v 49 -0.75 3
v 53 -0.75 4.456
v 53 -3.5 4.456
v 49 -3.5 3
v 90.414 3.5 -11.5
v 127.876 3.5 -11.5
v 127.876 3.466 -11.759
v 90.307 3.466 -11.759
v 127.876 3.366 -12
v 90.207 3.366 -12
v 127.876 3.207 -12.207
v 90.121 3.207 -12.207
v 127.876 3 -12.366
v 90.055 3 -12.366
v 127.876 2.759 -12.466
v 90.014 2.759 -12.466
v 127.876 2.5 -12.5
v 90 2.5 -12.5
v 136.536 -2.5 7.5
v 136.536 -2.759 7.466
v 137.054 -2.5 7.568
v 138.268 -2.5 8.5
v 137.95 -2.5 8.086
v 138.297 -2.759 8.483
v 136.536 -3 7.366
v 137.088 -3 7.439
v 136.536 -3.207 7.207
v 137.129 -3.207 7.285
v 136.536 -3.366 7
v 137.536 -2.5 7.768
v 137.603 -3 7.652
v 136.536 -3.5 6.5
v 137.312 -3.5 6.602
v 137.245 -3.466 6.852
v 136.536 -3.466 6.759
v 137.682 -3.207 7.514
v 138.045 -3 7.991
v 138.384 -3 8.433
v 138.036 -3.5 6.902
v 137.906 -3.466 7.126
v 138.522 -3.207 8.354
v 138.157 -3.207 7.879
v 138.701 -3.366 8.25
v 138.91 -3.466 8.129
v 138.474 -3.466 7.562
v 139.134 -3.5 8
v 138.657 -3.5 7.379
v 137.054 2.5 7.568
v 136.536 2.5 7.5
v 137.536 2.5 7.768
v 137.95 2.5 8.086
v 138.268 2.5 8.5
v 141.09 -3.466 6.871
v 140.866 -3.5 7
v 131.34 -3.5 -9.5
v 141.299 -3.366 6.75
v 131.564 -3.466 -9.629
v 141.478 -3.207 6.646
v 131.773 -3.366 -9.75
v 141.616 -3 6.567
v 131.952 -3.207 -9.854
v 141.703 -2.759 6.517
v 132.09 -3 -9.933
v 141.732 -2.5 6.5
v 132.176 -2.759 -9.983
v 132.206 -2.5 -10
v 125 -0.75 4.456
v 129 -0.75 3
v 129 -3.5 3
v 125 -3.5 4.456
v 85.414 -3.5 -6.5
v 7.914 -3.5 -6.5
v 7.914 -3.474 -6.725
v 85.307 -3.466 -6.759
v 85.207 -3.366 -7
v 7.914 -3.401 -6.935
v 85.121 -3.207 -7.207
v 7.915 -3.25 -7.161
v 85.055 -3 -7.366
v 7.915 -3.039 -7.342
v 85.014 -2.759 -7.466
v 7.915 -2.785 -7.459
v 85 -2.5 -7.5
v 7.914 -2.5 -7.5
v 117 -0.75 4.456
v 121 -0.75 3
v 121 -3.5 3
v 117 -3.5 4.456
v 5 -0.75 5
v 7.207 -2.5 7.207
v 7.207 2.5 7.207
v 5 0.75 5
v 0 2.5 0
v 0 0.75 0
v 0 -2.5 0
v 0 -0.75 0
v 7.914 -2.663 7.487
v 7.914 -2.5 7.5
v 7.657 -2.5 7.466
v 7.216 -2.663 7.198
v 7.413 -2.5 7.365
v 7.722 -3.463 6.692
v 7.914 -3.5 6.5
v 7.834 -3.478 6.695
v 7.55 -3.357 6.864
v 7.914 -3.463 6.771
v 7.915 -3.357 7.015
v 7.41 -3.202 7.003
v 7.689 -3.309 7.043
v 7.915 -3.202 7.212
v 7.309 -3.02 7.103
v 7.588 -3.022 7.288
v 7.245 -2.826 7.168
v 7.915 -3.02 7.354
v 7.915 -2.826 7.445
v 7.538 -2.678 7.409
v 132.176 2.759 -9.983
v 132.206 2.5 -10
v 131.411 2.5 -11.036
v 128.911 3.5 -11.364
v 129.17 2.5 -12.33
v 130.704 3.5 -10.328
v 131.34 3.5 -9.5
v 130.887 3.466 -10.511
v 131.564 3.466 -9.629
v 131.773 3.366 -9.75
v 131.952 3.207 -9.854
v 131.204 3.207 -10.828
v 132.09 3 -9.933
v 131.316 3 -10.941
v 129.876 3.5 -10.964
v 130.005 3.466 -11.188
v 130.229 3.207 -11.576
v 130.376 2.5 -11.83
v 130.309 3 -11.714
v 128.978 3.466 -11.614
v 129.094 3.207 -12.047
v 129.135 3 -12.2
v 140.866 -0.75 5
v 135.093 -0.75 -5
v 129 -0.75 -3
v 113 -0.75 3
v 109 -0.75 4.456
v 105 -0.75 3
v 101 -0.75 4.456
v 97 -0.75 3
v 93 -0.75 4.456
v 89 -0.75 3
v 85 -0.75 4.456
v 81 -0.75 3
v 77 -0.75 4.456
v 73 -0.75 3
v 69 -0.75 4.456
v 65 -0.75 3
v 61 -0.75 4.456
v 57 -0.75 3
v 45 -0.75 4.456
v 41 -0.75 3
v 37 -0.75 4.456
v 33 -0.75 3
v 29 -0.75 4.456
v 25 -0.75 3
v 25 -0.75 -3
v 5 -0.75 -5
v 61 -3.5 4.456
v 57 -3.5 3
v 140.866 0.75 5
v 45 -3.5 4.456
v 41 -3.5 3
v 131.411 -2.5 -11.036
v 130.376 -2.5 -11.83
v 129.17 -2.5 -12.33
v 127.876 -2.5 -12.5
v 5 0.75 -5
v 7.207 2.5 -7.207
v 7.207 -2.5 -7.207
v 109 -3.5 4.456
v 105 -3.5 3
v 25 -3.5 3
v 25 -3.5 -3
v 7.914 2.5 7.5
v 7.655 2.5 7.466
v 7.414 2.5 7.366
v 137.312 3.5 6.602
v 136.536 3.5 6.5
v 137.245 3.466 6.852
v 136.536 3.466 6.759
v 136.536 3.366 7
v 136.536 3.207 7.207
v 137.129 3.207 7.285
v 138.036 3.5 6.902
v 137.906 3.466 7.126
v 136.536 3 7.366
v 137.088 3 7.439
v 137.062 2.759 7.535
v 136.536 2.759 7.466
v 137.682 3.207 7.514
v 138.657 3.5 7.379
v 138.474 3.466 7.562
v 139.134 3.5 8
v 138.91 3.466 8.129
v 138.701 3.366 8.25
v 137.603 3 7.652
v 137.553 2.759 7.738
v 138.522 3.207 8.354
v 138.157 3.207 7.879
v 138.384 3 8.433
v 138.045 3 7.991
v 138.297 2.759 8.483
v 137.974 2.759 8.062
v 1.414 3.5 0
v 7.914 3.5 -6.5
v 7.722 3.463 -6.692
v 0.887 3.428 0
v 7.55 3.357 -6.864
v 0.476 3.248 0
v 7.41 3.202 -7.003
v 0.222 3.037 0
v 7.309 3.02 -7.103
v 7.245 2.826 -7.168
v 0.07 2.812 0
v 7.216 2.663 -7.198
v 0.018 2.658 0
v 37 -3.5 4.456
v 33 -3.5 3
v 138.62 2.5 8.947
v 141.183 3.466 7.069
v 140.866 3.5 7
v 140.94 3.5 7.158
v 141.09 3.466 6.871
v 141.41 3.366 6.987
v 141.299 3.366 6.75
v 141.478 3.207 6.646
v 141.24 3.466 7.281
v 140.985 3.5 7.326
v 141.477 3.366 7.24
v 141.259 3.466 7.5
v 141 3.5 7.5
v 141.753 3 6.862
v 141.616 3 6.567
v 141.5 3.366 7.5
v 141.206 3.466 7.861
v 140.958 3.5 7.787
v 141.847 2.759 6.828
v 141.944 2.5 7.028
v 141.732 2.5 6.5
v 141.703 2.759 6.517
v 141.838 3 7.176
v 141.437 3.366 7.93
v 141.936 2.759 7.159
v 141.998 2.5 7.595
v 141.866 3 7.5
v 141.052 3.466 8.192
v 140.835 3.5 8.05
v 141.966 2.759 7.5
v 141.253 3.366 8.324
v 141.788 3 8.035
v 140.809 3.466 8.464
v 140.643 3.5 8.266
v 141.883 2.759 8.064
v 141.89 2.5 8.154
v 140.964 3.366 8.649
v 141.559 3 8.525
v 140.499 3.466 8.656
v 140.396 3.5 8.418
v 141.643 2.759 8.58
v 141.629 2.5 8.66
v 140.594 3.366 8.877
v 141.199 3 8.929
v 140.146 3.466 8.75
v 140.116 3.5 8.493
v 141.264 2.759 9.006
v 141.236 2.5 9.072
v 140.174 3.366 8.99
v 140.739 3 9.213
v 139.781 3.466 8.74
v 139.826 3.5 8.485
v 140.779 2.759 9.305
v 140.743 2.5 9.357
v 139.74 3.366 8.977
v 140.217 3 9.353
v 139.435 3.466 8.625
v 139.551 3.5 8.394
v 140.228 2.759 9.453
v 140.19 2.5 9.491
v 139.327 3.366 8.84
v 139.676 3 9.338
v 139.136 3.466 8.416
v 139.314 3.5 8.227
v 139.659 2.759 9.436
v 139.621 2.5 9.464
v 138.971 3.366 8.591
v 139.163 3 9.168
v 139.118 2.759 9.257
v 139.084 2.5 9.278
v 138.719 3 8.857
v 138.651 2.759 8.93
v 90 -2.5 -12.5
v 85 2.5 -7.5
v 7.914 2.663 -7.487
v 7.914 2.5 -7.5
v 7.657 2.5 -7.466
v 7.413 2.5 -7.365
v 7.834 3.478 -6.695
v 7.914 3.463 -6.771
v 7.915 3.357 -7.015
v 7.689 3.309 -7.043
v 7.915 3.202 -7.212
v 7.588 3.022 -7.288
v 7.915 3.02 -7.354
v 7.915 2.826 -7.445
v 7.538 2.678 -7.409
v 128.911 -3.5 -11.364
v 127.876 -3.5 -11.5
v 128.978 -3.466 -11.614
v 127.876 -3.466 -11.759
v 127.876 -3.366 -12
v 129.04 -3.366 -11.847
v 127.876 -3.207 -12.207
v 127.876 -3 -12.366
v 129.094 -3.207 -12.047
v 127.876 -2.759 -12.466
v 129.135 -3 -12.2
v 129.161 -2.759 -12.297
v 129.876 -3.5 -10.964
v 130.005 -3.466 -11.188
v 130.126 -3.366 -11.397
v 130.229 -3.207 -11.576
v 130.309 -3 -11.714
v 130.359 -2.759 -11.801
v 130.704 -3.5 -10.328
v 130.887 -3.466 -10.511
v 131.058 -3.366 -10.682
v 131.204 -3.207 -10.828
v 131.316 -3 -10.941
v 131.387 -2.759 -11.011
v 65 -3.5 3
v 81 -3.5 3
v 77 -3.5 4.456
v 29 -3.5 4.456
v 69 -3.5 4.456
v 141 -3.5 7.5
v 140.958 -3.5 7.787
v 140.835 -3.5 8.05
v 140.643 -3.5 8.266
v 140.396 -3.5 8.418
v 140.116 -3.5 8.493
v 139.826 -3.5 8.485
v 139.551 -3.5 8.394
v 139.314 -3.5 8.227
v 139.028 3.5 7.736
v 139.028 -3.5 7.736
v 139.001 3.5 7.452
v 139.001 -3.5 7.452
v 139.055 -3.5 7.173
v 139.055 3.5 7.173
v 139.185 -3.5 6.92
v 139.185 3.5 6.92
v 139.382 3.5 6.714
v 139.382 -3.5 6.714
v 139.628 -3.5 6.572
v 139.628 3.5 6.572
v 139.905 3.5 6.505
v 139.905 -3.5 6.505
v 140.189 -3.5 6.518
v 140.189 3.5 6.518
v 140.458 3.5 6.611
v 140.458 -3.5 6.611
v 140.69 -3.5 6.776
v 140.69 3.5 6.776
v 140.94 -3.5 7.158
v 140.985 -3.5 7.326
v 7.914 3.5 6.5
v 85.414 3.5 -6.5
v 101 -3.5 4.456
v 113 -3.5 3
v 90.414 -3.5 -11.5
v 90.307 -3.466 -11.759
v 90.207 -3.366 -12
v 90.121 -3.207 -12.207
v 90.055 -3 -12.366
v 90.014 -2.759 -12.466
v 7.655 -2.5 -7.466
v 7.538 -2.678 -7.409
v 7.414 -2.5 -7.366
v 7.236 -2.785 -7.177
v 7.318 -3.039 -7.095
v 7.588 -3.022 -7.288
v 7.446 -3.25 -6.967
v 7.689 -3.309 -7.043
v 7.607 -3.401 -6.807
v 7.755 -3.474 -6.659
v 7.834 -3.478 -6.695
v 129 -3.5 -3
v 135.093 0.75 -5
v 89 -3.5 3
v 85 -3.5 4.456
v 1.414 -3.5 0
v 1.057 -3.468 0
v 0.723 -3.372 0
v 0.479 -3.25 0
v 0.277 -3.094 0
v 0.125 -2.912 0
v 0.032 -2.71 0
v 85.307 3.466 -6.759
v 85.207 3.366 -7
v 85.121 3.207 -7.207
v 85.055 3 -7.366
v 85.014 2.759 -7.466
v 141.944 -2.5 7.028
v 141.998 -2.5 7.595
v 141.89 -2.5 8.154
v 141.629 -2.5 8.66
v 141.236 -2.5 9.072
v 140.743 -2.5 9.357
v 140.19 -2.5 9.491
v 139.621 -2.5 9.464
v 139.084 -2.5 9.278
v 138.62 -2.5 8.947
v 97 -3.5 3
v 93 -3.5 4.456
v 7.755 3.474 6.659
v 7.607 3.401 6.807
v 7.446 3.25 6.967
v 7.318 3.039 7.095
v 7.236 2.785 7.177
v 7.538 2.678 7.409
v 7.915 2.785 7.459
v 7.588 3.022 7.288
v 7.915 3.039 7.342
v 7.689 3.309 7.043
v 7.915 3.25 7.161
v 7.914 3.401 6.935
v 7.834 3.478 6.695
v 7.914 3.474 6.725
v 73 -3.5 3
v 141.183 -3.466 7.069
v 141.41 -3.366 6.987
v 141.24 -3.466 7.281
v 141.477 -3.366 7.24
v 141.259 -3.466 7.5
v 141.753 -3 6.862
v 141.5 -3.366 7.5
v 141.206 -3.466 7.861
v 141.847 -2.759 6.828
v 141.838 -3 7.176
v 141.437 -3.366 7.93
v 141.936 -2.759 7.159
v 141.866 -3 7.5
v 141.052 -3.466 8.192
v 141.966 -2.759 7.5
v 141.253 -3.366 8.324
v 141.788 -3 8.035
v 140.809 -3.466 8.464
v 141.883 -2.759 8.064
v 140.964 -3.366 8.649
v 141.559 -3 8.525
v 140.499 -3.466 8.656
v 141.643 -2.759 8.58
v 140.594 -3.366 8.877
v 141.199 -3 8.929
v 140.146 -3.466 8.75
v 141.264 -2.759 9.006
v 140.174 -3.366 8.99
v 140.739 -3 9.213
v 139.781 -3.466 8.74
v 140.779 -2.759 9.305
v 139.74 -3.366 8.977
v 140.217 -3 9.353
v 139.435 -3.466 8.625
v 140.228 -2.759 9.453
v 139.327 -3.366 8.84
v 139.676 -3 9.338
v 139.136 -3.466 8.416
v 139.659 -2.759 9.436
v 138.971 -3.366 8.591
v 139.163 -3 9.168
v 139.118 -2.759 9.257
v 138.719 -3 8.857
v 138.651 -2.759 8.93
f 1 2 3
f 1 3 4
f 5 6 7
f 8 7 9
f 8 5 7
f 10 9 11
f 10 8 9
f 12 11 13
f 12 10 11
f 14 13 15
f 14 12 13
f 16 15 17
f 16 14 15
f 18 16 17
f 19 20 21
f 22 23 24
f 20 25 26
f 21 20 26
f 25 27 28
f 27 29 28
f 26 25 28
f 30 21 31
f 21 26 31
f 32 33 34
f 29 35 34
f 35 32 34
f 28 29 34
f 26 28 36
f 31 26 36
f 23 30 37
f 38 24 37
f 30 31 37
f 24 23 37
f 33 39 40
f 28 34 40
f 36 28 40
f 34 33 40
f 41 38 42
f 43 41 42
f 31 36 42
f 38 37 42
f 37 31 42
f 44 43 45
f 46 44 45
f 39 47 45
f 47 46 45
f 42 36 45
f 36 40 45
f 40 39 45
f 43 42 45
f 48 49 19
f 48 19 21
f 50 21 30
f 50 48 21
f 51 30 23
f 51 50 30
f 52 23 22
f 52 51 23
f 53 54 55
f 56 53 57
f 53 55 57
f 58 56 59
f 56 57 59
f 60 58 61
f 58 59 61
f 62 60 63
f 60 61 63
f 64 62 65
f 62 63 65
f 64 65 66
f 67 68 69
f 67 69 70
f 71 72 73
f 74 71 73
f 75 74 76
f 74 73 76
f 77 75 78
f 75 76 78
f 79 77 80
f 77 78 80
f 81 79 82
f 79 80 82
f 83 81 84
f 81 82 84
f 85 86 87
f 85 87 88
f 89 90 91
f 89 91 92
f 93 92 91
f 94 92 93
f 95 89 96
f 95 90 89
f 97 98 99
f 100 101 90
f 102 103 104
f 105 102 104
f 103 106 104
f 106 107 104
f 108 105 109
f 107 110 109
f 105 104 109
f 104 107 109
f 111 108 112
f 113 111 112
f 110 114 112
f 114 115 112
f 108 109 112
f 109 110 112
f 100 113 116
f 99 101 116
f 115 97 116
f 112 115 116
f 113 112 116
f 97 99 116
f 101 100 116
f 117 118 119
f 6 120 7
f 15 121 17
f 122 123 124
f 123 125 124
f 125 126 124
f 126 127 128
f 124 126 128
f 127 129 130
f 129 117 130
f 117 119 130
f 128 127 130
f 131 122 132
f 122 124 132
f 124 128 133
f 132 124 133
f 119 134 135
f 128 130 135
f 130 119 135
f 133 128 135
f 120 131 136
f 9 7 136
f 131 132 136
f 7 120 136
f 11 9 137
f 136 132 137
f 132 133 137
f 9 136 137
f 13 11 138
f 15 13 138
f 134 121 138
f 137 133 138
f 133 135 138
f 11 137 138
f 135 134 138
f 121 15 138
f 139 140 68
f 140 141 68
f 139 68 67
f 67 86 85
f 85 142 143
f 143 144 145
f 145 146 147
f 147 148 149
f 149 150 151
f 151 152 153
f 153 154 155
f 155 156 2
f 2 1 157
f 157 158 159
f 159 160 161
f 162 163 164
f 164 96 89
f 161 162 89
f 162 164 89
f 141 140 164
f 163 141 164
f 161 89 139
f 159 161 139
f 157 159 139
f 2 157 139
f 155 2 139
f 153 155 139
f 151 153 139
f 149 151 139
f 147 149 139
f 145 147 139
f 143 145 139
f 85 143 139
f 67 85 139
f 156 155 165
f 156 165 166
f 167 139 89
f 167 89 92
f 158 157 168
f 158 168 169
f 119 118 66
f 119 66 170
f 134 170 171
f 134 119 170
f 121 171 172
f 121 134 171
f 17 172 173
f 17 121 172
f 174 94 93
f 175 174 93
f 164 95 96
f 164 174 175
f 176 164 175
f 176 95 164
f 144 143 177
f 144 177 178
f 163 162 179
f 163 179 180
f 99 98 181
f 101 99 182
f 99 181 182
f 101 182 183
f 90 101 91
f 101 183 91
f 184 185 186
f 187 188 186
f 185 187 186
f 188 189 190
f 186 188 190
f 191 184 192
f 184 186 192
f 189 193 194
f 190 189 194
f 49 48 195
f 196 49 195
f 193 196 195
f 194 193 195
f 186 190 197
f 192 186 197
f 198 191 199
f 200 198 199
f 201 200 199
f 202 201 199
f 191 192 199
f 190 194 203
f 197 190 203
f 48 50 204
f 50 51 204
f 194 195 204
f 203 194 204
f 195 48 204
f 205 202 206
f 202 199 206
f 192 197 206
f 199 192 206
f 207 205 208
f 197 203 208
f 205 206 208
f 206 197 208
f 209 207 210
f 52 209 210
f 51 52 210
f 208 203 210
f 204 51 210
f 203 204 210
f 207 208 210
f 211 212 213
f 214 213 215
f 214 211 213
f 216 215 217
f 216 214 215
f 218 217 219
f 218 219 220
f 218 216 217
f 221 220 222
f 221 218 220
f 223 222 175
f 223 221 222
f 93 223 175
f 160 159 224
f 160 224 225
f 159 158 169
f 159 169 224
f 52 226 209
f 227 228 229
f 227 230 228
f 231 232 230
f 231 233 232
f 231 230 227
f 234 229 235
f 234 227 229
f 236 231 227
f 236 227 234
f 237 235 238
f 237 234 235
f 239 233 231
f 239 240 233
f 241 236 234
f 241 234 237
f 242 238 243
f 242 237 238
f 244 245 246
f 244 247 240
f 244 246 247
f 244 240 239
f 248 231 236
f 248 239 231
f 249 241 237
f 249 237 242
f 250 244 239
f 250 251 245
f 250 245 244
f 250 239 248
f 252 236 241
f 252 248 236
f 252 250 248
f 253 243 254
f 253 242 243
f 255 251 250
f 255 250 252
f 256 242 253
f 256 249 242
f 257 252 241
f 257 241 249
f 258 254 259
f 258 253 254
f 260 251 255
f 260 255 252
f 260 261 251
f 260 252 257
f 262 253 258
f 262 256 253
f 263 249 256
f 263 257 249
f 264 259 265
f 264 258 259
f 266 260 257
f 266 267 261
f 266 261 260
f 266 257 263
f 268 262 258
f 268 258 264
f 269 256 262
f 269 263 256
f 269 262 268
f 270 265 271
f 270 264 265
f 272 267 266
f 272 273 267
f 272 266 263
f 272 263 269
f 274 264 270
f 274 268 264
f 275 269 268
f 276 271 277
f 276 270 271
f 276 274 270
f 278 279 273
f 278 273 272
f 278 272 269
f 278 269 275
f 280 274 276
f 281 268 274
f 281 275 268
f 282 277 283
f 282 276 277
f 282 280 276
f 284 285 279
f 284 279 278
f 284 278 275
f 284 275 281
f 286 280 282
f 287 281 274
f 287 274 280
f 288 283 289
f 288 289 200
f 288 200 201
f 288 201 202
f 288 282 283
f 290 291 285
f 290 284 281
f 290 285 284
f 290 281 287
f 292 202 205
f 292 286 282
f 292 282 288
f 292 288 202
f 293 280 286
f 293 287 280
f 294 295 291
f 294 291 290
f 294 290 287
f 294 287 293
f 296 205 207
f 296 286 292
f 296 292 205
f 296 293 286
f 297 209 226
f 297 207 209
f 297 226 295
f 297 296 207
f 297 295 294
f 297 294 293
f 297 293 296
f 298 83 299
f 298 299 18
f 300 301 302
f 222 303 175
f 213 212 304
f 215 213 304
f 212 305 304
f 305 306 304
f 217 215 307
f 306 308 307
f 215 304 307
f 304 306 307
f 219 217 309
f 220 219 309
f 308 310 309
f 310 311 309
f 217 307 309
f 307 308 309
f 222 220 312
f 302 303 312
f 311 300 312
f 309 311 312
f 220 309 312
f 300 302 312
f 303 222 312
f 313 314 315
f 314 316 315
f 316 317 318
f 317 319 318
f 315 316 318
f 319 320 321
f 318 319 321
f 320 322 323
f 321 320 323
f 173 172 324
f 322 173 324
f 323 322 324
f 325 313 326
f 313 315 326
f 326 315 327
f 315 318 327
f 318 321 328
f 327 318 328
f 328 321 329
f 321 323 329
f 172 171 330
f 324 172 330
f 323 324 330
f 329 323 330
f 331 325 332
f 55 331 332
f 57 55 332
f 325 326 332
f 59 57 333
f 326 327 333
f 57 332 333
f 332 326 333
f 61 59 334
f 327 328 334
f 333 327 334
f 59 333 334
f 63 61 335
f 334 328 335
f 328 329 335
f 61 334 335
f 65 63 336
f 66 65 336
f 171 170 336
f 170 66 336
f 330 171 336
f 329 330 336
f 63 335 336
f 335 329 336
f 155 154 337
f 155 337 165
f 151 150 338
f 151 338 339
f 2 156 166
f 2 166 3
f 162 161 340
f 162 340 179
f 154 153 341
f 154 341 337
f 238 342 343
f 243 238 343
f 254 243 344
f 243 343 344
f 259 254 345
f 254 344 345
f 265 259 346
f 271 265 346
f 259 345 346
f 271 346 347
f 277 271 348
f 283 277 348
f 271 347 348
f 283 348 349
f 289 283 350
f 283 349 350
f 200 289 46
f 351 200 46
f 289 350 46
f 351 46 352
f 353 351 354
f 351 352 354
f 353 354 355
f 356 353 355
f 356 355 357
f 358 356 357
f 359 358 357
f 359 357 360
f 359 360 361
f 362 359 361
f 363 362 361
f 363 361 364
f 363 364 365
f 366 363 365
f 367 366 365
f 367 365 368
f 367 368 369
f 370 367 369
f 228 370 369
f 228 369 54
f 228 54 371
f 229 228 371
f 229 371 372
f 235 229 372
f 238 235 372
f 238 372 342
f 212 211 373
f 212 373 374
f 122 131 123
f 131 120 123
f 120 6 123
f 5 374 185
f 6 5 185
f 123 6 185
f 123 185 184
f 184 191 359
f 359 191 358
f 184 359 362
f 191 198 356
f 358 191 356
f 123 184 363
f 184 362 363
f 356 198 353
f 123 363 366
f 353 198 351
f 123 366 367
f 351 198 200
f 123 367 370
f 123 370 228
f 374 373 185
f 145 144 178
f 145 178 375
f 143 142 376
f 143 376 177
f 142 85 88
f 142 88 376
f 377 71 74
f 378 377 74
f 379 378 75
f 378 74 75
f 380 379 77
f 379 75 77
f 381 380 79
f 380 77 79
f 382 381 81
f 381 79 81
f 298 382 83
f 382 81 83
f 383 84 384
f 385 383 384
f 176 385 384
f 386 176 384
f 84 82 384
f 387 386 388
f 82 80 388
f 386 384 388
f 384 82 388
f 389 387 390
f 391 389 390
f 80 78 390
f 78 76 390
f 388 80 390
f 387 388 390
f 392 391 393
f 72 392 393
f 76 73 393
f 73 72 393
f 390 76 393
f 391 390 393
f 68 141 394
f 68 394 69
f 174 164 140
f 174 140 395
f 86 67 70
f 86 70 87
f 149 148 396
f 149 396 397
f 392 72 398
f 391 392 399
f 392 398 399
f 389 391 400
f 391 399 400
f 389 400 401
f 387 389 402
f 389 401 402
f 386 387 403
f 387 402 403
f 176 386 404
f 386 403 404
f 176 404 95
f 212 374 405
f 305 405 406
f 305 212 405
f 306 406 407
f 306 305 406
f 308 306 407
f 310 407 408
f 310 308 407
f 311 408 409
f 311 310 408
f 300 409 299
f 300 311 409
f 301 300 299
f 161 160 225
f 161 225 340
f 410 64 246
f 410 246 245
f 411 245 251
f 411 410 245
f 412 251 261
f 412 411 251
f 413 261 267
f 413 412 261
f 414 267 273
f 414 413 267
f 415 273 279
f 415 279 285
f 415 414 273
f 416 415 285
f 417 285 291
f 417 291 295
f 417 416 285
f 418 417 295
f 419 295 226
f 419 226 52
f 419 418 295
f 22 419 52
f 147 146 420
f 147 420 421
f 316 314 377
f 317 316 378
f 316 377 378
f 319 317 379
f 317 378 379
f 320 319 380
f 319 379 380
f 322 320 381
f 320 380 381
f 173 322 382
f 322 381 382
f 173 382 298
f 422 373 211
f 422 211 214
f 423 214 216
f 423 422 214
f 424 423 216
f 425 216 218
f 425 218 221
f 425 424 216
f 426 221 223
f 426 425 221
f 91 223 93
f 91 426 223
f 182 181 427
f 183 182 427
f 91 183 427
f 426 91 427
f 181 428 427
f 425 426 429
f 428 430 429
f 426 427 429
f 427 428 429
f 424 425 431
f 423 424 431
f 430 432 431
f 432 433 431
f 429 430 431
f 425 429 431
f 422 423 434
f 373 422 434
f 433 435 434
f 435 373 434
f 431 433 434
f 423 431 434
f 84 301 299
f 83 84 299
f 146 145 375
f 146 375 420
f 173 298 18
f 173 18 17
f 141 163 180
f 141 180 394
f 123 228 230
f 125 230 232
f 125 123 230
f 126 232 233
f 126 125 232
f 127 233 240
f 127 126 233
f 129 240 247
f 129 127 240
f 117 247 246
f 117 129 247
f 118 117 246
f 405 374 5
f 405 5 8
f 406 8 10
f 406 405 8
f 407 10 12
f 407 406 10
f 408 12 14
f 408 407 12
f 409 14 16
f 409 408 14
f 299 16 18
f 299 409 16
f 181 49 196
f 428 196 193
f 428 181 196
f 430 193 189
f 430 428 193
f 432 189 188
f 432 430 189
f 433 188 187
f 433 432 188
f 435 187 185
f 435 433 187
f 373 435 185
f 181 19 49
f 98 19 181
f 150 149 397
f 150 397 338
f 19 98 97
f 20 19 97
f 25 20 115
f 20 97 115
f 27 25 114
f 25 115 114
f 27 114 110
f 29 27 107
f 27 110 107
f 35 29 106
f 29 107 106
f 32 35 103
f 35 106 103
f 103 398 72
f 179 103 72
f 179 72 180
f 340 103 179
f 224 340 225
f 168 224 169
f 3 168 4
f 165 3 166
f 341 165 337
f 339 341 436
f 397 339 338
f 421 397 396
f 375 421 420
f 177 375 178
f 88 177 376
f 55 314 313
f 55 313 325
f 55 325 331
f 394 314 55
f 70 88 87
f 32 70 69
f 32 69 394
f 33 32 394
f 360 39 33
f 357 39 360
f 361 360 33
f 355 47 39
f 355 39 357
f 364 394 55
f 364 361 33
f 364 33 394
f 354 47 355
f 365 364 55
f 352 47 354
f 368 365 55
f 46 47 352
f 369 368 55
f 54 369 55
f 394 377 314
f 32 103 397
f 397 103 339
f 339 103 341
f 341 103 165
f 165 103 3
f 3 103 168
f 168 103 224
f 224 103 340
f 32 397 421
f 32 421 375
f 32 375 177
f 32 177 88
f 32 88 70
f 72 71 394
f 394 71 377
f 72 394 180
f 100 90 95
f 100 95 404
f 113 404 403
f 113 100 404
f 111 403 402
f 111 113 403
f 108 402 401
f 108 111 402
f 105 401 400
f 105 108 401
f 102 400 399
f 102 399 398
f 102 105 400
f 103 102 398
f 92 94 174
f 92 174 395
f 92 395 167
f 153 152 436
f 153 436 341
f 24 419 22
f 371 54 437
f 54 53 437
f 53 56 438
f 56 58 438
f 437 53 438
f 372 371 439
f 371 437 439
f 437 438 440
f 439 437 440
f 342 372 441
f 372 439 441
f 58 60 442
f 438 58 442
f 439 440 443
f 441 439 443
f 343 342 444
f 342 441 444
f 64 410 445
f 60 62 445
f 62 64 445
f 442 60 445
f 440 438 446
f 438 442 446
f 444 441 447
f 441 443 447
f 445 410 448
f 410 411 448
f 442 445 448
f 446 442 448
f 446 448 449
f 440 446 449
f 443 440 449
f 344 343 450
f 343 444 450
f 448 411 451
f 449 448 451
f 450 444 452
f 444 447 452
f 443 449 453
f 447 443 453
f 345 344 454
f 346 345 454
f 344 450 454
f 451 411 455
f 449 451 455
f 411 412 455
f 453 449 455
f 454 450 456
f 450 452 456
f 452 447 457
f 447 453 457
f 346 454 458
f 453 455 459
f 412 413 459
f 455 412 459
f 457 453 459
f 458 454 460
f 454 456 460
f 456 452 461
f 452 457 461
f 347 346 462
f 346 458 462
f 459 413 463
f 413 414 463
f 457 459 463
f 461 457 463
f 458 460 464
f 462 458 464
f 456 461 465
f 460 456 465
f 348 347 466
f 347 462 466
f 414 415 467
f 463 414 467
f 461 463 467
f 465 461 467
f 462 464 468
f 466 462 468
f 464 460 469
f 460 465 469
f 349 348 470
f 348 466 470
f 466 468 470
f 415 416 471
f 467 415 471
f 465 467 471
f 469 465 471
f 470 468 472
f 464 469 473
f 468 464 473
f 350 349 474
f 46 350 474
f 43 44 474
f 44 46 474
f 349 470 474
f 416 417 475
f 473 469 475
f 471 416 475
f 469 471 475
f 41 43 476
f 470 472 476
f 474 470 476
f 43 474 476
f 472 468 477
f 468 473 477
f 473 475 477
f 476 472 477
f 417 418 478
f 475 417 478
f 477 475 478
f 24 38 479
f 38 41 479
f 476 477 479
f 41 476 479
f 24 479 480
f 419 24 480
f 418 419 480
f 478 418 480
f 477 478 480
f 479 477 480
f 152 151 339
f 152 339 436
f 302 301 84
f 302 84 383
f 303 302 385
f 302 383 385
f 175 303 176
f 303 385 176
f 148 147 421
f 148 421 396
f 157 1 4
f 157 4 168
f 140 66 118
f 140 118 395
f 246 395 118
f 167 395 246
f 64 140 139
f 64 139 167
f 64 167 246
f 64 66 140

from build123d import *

# Parameters (mm, degrees)
F1_DEPTH     = 3.5
F3_DEPTH     = 3.501
F4_W         = 1.5
F4_H         = 10
F5_DEPTH     = 142.001
F6_R         = 1
F7_DEPTH     = 7.001
F8_R         = 2
F9_T1_DEPTH  = 131.5358983849
F9_T3_DEPTH  = 45.762395693
F9_T5_DEPTH  = 15.6066017178
F9_T7_DEPTH  = 15.6066017178
F9_T9_DEPTH  = 24.4393102292
F9_T14_DEPTH = 12.0710678119
F9_T19_DEPTH = 12.0710678119
F9_T24_DEPTH = 82.5
F9_T29_DEPTH = 82.5
F9_T32_ANGLE = 60
F9_T34_ANGLE = 180
F9_T36_ANGLE = 60
F9_T38_ANGLE = 180
F9_T43_DEPTH = 82.5
F9_T47_DEPTH = 12.0710678119
F9_T54_DEPTH = 82.5
F9_T58_DEPTH = 12.0710678119
F10_R        = 1
F11_T1_DEPTH = 6.9999999999
F11_T4_ANGLE = 60
F11_T6_ANGLE = 60


# Not quite as in the source:
# - a fillet or chamfer that OpenCascade refuses, or shapes differently, is made with other operations: its cross-section is extruded or revolved along the edge and cut away or added


with BuildPart() as f1:
    # F0 (on Front) → F1 (new body, symmetric)
    with BuildSketch(Plane.XZ):
        with BuildLine():
            Line((0, 0), (7.5, -7.5))
            Line((7.5, -7.5), (85, -7.5))
            Line((85, -7.5), (90, -12.5))
            Line((90, -12.5), (130.762395693, -12.5))
            Line((130.762395693, -12.5), (141.7320508076, 6.5))
            ThreePointArc((141.7320508076, 6.5), (140.5176380902, 9.4318516526), (138, 7.5))
            Line((138, 7.5), (7.5, 7.5))
            Line((7.5, 7.5), (0, 0))
        make_face()
    extrude(amount=F1_DEPTH, both=True)

    # F2 (on Front) → F3 (cut, through all)
    with BuildSketch(Plane.XZ):
        Polygon((29, 4.4558809371), (25, 3), (25, -3), (33, -3), (33, 3), align=None)
        Polygon((37, 4.4558809371), (33, 3), (33, -3), (41, -3), (49, -3), (57, -3), (65, -3), (73, -3), (81, -3), (89, -3), (97, -3), (105, -3), (113, -3), (121, -3), (129, -3), (129, 3), (125, 4.4558809371), (121, 3), (117, 4.4558809371), (113, 3), (109, 4.4558809371), (105, 3), (101, 4.4558809371), (97, 3), (93, 4.4558809371), (89, 3), (85, 4.4558809371), (81, 3), (77, 4.4558809371), (73, 3), (69, 4.4558809371), (65, 3), (61, 4.4558809371), (57, 3), (53, 4.4558809371), (49, 3), (45, 4.4558809371), (41, 3), align=None)
    extrude(amount=F3_DEPTH, mode=Mode.SUBTRACT)

    # F4 (on Right) → F5 (cut, through all)
    with BuildSketch(Plane.YZ):
        Rectangle(F4_W, F4_H)
    extrude(amount=F5_DEPTH, mode=Mode.SUBTRACT)

    # F6 (on face) → F7 (cut, through all)
    with BuildSketch(Plane.XZ.offset(3.5)):
        with Locations((140, 7.5)):
            Circle(F6_R)
    extrude(amount=-F7_DEPTH, mode=Mode.SUBTRACT)

    # F8
    f8_edges = [f1.edges().sort_by_distance(p)[0] for p in [
        (138, 0, 7.5),
    ]]
    fillet(f8_edges, radius=F8_R)

    # F9: fillet of radius 1 on 12 edges, made by hand

    # F9_s2 → F9_t1 (cut)
    with BuildSketch(Plane.YZ.offset(5)):
        with BuildLine():
            ThreePointArc((-2.5, 7.5), (-3.2071067812, 7.2071067812), (-3.5, 6.5))
            Line((-3.5, 6.5), (-3.5, 7.5))
            Line((-3.5, 7.5), (-2.5, 7.5))
        make_face()
        with BuildLine():
            ThreePointArc((2.5, 7.5), (3.2071067812, 7.2071067812), (3.5, 6.5))
            Line((3.5, 6.5), (3.5, 7.5))
            Line((3.5, 7.5), (2.5, 7.5))
        make_face()
    extrude(amount=F9_T1_DEPTH, mode=Mode.SUBTRACT)

    # F9_s4 → F9_t3 (cut)
    with BuildSketch(Plane.YZ.offset(87.5)):
        with BuildLine():
            ThreePointArc((-3.5, -11.5), (-3.2071067812, -12.2071067812), (-2.5, -12.5))
            Line((-2.5, -12.5), (-3.5, -12.5))
            Line((-3.5, -12.5), (-3.5, -11.5))
        make_face()
        with BuildLine():
            ThreePointArc((3.5, -11.5), (3.2071067812, -12.2071067812), (2.5, -12.5))
            Line((2.5, -12.5), (3.5, -12.5))
            Line((3.5, -12.5), (3.5, -11.5))
        make_face()
    extrude(amount=F9_T3_DEPTH, mode=Mode.SUBTRACT)

    # F9_s6 → F9_t5 (cut)
    with BuildSketch(Plane(origin=(-1.767766953, 0, 1.767766953), x_dir=(0, 1, 0), z_dir=(0.7071067812, 0, -0.7071067812))):
        with BuildLine():
            ThreePointArc((-3.5, 1), (-3.2071067812, 0.2928932188), (-2.5, 0))
            Line((-2.5, 0), (-3.5, 0))
            Line((-3.5, 0), (-3.5, 1))
        make_face()
        with BuildLine():
            ThreePointArc((3.5, 1), (3.2071067812, 0.2928932188), (2.5, 0))
            Line((2.5, 0), (3.5, 0))
            Line((3.5, 0), (3.5, 1))
        make_face()
    extrude(amount=F9_T5_DEPTH, mode=Mode.SUBTRACT)

    # F9_s8 → F9_t7 (cut)
    with BuildSketch(Plane(origin=(9.267766953, 0, 9.267766953), x_dir=(0, 1, 0), z_dir=(-0.7071067812, 0, -0.7071067812))):
        with BuildLine():
            ThreePointArc((-2.5, 0), (-3.2071067812, 0.2928932188), (-3.5, 1))
            Line((-3.5, 1), (-3.5, 0))
            Line((-3.5, 0), (-2.5, 0))
        make_face()
        with BuildLine():
            ThreePointArc((3.5, 1), (3.2071067812, 0.2928932188), (2.5, 0))
            Line((2.5, 0), (3.5, 0))
            Line((3.5, 0), (3.5, 1))
        make_face()
    extrude(amount=F9_T7_DEPTH, mode=Mode.SUBTRACT)

    # F9_s10 → F9_t9 (cut)
    with BuildSketch(Plane(origin=(26.0279401496, 0, 45.0817147554), x_dir=(0, 1, 0), z_dir=(0.5, 0, 0.8660254038))):
        with BuildLine():
            ThreePointArc((3.5, -118.4935565298), (3.2071067812, -119.200663311), (2.5, -119.4935565298))
            Line((2.5, -119.4935565298), (3.5, -119.4935565298))
            Line((3.5, -119.4935565298), (3.5, -118.4935565298))
        make_face()
        with BuildLine():
            ThreePointArc((-3.5, -118.4935565298), (-3.2071067812, -119.200663311), (-2.5, -119.4935565298))
            Line((-2.5, -119.4935565298), (-3.5, -119.4935565298))
            Line((-3.5, -119.4935565298), (-3.5, -118.4935565298))
        make_face()
    extrude(amount=F9_T9_DEPTH, mode=Mode.SUBTRACT)


with BuildPart() as f9_tool12:
    # F9_s13 → F9_t14 (new body)
    with BuildSketch(Plane(origin=(44.482233047, 0, -44.482233047), x_dir=(0, 1, 0), z_dir=(0.7071067812, 0, -0.7071067812))):
        with BuildLine():
            ThreePointArc((-3.5, 55.800775542), (-3.2071067812, 55.0936687608), (-2.5, 54.800775542))
            Line((-2.5, 54.800775542), (-3.5, 54.800775542))
            Line((-3.5, 54.800775542), (-3.5, 55.800775542))
        make_face()
    extrude(amount=F9_T14_DEPTH)

    split(bisect_by=Plane.XY.offset(-7.5), keep=Keep.BOTTOM)


with BuildPart() as f1_1:
    add(f1.part)

    # F9_t11: cut F9_tool12
    add(f9_tool12.part, mode=Mode.SUBTRACT)


with BuildPart() as f9_tool17:
    # F9_s18 → F9_t19 (new body)
    with BuildSketch(Plane(origin=(44.482233047, 0, -44.482233047), x_dir=(0, 1, 0), z_dir=(0.7071067812, 0, -0.7071067812))):
        with BuildLine():
            ThreePointArc((3.5, 55.800775542), (3.2071067812, 55.0936687608), (2.5, 54.800775542))
            Line((2.5, 54.800775542), (3.5, 54.800775542))
            Line((3.5, 54.800775542), (3.5, 55.800775542))
        make_face()
    extrude(amount=F9_T19_DEPTH)

    split(bisect_by=Plane.XY.offset(-7.5), keep=Keep.BOTTOM)


with BuildPart() as f1_2:
    add(f1_1.part)

    # F9_t16: cut F9_tool17
    add(f9_tool17.part, mode=Mode.SUBTRACT)


with BuildPart() as f9_tool22:
    # F9_s23 → F9_t24 (new body)
    with BuildSketch(Plane.YZ.offset(5)):
        with BuildLine():
            ThreePointArc((-3.5, -6.5), (-3.2071067812, -7.2071067812), (-2.5, -7.5))
            Line((-2.5, -7.5), (-3.5, -7.5))
            Line((-3.5, -7.5), (-3.5, -6.5))
        make_face()
    extrude(amount=F9_T24_DEPTH)

    split(bisect_by=Plane(origin=(38.75, 0, 38.75), x_dir=(0, 1, 0), z_dir=(-0.7071067812, 0, -0.7071067812)), keep=Keep.TOP)


with BuildPart() as f1_3:
    add(f1_2.part)

    # F9_t21: cut F9_tool22
    add(f9_tool22.part, mode=Mode.SUBTRACT)


with BuildPart() as f9_tool27:
    # F9_s28 → F9_t29 (new body)
    with BuildSketch(Plane.YZ.offset(5)):
        with BuildLine():
            ThreePointArc((3.5, -6.5), (3.2071067812, -7.2071067812), (2.5, -7.5))
            Line((2.5, -7.5), (3.5, -7.5))
            Line((3.5, -7.5), (3.5, -6.5))
        make_face()
    extrude(amount=F9_T29_DEPTH)

    split(bisect_by=Plane(origin=(38.75, 0, 38.75), x_dir=(0, 1, 0), z_dir=(-0.7071067812, 0, -0.7071067812)), keep=Keep.TOP)


with BuildPart() as f1_4:
    add(f1_3.part)

    # F9_t26: cut F9_tool27
    add(f9_tool27.part, mode=Mode.SUBTRACT)

    # F9_s31 → F9_t32 (revolve, cut)
    with BuildSketch(Plane.YZ.offset(136.5358983849)):
        with BuildLine():
            ThreePointArc((3.5, 6.5), (3.2071067812, 7.2071067812), (2.5, 7.5))
            Line((2.5, 7.5), (3.5, 7.5))
            Line((3.5, 7.5), (3.5, 6.5))
        make_face()
    revolve(axis=Axis((136.5358983849, 3.5, 9.5), (0, -1, 0)), revolution_arc=F9_T32_ANGLE, mode=Mode.SUBTRACT)

    # F9_s33 → F9_t34 (revolve, cut)
    with BuildSketch(Plane(origin=(38.2475952642, 0, 66.2467782649), x_dir=(0, 1, 0), z_dir=(-0.5, 0, -0.8660254038))):
        with BuildLine():
            ThreePointArc((3.5, 118.4935565298), (3.2071067812, 119.200663311), (2.5, 119.4935565298))
            Line((2.5, 119.4935565298), (3.5, 119.4935565298))
            Line((3.5, 119.4935565298), (3.5, 118.4935565298))
        make_face()
    revolve(axis=Axis((140, 3.5, 7.5), (0, -1, 0)), revolution_arc=F9_T34_ANGLE, mode=Mode.SUBTRACT)

    # F9_s35 → F9_t36 (revolve, cut)
    with BuildSketch(Plane.YZ.offset(136.5358983849)):
        with BuildLine():
            ThreePointArc((-2.5, 7.5), (-3.2071067812, 7.2071067812), (-3.5, 6.5))
            Line((-3.5, 6.5), (-3.5, 7.5))
            Line((-3.5, 7.5), (-2.5, 7.5))
        make_face()
    revolve(axis=Axis((136.5358983849, -3.5, 9.5), (0, -1, 0)), revolution_arc=F9_T36_ANGLE, mode=Mode.SUBTRACT)

    # F9_s37 → F9_t38 (revolve, cut)
    with BuildSketch(Plane(origin=(38.2475952642, 0, 66.2467782649), x_dir=(0, 1, 0), z_dir=(-0.5, 0, -0.8660254038))):
        with BuildLine():
            ThreePointArc((-3.5, 118.4935565298), (-3.2071067812, 119.200663311), (-2.5, 119.4935565298))
            Line((-2.5, 119.4935565298), (-3.5, 119.4935565298))
            Line((-3.5, 119.4935565298), (-3.5, 118.4935565298))
        make_face()
    revolve(axis=Axis((140, -3.5, 7.5), (0, -1, 0)), revolution_arc=F9_T38_ANGLE, mode=Mode.SUBTRACT)


with BuildPart() as f9_tool41:
    # F9_s42 → F9_t43 (new body)
    with BuildSketch(Plane.YZ.offset(5)):
        with BuildLine():
            ThreePointArc((-3.5, -6.5), (-3.2071067812, -7.2071067812), (-2.5, -7.5))
            Line((-2.5, -7.5), (-3.5, -7.5))
            Line((-3.5, -7.5), (-3.5, -6.5))
        make_face()
    extrude(amount=F9_T43_DEPTH)

    split(bisect_by=Plane(origin=(38.75, 0, 38.75), x_dir=(0, 1, 0), z_dir=(0.7071067812, 0, 0.7071067812)), keep=Keep.TOP)


with BuildPart() as f9_tool45:
    # F9_s46 → F9_t47 (new body)
    with BuildSketch(Plane(origin=(44.482233047, 0, -44.482233047), x_dir=(0, 1, 0), z_dir=(0.7071067812, 0, -0.7071067812))):
        with BuildLine():
            ThreePointArc((-3.5, 55.800775542), (-3.2071067812, 55.0936687608), (-2.5, 54.800775542))
            Line((-2.5, 54.800775542), (-3.5, 54.800775542))
            Line((-3.5, 54.800775542), (-3.5, 55.800775542))
        make_face()
    extrude(amount=F9_T47_DEPTH)

    split(bisect_by=Plane.XY.offset(-7.5), keep=Keep.TOP)


with BuildPart() as f9_tool41_1:
    add(f9_tool41.part)

    # F9_t49: intersect F9_tool45
    add(f9_tool45.part, mode=Mode.INTERSECT)


with BuildPart() as f1_5:
    add(f1_4.part)

    # F9_t39: cut F9_tool41
    add(f9_tool41_1.part, mode=Mode.SUBTRACT)


with BuildPart() as f9_tool52:
    # F9_s53 → F9_t54 (new body)
    with BuildSketch(Plane.YZ.offset(5)):
        with BuildLine():
            ThreePointArc((3.5, -6.5), (3.2071067812, -7.2071067812), (2.5, -7.5))
            Line((2.5, -7.5), (3.5, -7.5))
            Line((3.5, -7.5), (3.5, -6.5))
        make_face()
    extrude(amount=F9_T54_DEPTH)

    split(bisect_by=Plane(origin=(38.75, 0, 38.75), x_dir=(0, 1, 0), z_dir=(0.7071067812, 0, 0.7071067812)), keep=Keep.TOP)


with BuildPart() as f9_tool56:
    # F9_s57 → F9_t58 (new body)
    with BuildSketch(Plane(origin=(44.482233047, 0, -44.482233047), x_dir=(0, 1, 0), z_dir=(0.7071067812, 0, -0.7071067812))):
        with BuildLine():
            ThreePointArc((3.5, 55.800775542), (3.2071067812, 55.0936687608), (2.5, 54.800775542))
            Line((2.5, 54.800775542), (3.5, 54.800775542))
            Line((3.5, 54.800775542), (3.5, 55.800775542))
        make_face()
    extrude(amount=F9_T58_DEPTH)

    split(bisect_by=Plane.XY.offset(-7.5), keep=Keep.TOP)


with BuildPart() as f9_tool52_1:
    add(f9_tool52.part)

    # F9_t60: intersect F9_tool56
    add(f9_tool56.part, mode=Mode.INTERSECT)


with BuildPart() as f1_6:
    add(f1_5.part)

    # F9_t50: cut F9_tool52
    add(f9_tool52_1.part, mode=Mode.SUBTRACT)

    # F10
    f10_edges = [f1_6.edges().sort_by_distance(p)[0] for p in [
        (7.5, 0, 7.5),
        (7.5, 0, -7.5),
    ]]
    fillet(f10_edges, radius=F10_R)

    # F11: fillet of radius 5 on 1 edges, made by hand

    # F11_s2 → F11_t1 (cut)
    with BuildSketch(Plane.XZ.offset(-3.5)):
        with BuildLine():
            ThreePointArc((132.2057713659, -10), (130.375644347, -11.8301270189), (127.875644347, -12.5))
            Line((127.875644347, -12.5), (130.762395693, -12.5))
            Line((130.762395693, -12.5), (132.2057713659, -10))
        make_face()
    extrude(amount=F11_T1_DEPTH, mode=Mode.SUBTRACT)

    # F11_s3 → F11_t4 (revolve, cut)
    with BuildSketch(Plane(origin=(28.7213158226, 0, 49.7467782649), x_dir=(0, 1, 0), z_dir=(0.5, 0, 0.8660254038))):
        with BuildLine():
            ThreePointArc((3.5, -118.4935565299), (3.2071067812, -119.200663311), (2.5, -119.4935565298))
            Line((2.5, -119.4935565298), (3.5, -119.4935565298))
            Line((3.5, -119.4935565298), (3.5, -118.4935565299))
        make_face()
    revolve(axis=Axis((127.875644347, 3.5, -7.5), (0, 1, 0)), revolution_arc=F11_T4_ANGLE, mode=Mode.SUBTRACT)

    # F11_s5 → F11_t6 (revolve, cut)
    with BuildSketch(Plane.YZ.offset(127.875644347)):
        with BuildLine():
            ThreePointArc((-3.5, -11.5), (-3.2071067812, -12.2071067812), (-2.5, -12.5))
            Line((-2.5, -12.5), (-3.5, -12.5))
            Line((-3.5, -12.5), (-3.5, -11.5))
        make_face()
    revolve(axis=Axis((127.875644347, -3.5, -7.5), (0, -1, 0)), revolution_arc=F11_T6_ANGLE, mode=Mode.SUBTRACT)


solid = f1_6.part
